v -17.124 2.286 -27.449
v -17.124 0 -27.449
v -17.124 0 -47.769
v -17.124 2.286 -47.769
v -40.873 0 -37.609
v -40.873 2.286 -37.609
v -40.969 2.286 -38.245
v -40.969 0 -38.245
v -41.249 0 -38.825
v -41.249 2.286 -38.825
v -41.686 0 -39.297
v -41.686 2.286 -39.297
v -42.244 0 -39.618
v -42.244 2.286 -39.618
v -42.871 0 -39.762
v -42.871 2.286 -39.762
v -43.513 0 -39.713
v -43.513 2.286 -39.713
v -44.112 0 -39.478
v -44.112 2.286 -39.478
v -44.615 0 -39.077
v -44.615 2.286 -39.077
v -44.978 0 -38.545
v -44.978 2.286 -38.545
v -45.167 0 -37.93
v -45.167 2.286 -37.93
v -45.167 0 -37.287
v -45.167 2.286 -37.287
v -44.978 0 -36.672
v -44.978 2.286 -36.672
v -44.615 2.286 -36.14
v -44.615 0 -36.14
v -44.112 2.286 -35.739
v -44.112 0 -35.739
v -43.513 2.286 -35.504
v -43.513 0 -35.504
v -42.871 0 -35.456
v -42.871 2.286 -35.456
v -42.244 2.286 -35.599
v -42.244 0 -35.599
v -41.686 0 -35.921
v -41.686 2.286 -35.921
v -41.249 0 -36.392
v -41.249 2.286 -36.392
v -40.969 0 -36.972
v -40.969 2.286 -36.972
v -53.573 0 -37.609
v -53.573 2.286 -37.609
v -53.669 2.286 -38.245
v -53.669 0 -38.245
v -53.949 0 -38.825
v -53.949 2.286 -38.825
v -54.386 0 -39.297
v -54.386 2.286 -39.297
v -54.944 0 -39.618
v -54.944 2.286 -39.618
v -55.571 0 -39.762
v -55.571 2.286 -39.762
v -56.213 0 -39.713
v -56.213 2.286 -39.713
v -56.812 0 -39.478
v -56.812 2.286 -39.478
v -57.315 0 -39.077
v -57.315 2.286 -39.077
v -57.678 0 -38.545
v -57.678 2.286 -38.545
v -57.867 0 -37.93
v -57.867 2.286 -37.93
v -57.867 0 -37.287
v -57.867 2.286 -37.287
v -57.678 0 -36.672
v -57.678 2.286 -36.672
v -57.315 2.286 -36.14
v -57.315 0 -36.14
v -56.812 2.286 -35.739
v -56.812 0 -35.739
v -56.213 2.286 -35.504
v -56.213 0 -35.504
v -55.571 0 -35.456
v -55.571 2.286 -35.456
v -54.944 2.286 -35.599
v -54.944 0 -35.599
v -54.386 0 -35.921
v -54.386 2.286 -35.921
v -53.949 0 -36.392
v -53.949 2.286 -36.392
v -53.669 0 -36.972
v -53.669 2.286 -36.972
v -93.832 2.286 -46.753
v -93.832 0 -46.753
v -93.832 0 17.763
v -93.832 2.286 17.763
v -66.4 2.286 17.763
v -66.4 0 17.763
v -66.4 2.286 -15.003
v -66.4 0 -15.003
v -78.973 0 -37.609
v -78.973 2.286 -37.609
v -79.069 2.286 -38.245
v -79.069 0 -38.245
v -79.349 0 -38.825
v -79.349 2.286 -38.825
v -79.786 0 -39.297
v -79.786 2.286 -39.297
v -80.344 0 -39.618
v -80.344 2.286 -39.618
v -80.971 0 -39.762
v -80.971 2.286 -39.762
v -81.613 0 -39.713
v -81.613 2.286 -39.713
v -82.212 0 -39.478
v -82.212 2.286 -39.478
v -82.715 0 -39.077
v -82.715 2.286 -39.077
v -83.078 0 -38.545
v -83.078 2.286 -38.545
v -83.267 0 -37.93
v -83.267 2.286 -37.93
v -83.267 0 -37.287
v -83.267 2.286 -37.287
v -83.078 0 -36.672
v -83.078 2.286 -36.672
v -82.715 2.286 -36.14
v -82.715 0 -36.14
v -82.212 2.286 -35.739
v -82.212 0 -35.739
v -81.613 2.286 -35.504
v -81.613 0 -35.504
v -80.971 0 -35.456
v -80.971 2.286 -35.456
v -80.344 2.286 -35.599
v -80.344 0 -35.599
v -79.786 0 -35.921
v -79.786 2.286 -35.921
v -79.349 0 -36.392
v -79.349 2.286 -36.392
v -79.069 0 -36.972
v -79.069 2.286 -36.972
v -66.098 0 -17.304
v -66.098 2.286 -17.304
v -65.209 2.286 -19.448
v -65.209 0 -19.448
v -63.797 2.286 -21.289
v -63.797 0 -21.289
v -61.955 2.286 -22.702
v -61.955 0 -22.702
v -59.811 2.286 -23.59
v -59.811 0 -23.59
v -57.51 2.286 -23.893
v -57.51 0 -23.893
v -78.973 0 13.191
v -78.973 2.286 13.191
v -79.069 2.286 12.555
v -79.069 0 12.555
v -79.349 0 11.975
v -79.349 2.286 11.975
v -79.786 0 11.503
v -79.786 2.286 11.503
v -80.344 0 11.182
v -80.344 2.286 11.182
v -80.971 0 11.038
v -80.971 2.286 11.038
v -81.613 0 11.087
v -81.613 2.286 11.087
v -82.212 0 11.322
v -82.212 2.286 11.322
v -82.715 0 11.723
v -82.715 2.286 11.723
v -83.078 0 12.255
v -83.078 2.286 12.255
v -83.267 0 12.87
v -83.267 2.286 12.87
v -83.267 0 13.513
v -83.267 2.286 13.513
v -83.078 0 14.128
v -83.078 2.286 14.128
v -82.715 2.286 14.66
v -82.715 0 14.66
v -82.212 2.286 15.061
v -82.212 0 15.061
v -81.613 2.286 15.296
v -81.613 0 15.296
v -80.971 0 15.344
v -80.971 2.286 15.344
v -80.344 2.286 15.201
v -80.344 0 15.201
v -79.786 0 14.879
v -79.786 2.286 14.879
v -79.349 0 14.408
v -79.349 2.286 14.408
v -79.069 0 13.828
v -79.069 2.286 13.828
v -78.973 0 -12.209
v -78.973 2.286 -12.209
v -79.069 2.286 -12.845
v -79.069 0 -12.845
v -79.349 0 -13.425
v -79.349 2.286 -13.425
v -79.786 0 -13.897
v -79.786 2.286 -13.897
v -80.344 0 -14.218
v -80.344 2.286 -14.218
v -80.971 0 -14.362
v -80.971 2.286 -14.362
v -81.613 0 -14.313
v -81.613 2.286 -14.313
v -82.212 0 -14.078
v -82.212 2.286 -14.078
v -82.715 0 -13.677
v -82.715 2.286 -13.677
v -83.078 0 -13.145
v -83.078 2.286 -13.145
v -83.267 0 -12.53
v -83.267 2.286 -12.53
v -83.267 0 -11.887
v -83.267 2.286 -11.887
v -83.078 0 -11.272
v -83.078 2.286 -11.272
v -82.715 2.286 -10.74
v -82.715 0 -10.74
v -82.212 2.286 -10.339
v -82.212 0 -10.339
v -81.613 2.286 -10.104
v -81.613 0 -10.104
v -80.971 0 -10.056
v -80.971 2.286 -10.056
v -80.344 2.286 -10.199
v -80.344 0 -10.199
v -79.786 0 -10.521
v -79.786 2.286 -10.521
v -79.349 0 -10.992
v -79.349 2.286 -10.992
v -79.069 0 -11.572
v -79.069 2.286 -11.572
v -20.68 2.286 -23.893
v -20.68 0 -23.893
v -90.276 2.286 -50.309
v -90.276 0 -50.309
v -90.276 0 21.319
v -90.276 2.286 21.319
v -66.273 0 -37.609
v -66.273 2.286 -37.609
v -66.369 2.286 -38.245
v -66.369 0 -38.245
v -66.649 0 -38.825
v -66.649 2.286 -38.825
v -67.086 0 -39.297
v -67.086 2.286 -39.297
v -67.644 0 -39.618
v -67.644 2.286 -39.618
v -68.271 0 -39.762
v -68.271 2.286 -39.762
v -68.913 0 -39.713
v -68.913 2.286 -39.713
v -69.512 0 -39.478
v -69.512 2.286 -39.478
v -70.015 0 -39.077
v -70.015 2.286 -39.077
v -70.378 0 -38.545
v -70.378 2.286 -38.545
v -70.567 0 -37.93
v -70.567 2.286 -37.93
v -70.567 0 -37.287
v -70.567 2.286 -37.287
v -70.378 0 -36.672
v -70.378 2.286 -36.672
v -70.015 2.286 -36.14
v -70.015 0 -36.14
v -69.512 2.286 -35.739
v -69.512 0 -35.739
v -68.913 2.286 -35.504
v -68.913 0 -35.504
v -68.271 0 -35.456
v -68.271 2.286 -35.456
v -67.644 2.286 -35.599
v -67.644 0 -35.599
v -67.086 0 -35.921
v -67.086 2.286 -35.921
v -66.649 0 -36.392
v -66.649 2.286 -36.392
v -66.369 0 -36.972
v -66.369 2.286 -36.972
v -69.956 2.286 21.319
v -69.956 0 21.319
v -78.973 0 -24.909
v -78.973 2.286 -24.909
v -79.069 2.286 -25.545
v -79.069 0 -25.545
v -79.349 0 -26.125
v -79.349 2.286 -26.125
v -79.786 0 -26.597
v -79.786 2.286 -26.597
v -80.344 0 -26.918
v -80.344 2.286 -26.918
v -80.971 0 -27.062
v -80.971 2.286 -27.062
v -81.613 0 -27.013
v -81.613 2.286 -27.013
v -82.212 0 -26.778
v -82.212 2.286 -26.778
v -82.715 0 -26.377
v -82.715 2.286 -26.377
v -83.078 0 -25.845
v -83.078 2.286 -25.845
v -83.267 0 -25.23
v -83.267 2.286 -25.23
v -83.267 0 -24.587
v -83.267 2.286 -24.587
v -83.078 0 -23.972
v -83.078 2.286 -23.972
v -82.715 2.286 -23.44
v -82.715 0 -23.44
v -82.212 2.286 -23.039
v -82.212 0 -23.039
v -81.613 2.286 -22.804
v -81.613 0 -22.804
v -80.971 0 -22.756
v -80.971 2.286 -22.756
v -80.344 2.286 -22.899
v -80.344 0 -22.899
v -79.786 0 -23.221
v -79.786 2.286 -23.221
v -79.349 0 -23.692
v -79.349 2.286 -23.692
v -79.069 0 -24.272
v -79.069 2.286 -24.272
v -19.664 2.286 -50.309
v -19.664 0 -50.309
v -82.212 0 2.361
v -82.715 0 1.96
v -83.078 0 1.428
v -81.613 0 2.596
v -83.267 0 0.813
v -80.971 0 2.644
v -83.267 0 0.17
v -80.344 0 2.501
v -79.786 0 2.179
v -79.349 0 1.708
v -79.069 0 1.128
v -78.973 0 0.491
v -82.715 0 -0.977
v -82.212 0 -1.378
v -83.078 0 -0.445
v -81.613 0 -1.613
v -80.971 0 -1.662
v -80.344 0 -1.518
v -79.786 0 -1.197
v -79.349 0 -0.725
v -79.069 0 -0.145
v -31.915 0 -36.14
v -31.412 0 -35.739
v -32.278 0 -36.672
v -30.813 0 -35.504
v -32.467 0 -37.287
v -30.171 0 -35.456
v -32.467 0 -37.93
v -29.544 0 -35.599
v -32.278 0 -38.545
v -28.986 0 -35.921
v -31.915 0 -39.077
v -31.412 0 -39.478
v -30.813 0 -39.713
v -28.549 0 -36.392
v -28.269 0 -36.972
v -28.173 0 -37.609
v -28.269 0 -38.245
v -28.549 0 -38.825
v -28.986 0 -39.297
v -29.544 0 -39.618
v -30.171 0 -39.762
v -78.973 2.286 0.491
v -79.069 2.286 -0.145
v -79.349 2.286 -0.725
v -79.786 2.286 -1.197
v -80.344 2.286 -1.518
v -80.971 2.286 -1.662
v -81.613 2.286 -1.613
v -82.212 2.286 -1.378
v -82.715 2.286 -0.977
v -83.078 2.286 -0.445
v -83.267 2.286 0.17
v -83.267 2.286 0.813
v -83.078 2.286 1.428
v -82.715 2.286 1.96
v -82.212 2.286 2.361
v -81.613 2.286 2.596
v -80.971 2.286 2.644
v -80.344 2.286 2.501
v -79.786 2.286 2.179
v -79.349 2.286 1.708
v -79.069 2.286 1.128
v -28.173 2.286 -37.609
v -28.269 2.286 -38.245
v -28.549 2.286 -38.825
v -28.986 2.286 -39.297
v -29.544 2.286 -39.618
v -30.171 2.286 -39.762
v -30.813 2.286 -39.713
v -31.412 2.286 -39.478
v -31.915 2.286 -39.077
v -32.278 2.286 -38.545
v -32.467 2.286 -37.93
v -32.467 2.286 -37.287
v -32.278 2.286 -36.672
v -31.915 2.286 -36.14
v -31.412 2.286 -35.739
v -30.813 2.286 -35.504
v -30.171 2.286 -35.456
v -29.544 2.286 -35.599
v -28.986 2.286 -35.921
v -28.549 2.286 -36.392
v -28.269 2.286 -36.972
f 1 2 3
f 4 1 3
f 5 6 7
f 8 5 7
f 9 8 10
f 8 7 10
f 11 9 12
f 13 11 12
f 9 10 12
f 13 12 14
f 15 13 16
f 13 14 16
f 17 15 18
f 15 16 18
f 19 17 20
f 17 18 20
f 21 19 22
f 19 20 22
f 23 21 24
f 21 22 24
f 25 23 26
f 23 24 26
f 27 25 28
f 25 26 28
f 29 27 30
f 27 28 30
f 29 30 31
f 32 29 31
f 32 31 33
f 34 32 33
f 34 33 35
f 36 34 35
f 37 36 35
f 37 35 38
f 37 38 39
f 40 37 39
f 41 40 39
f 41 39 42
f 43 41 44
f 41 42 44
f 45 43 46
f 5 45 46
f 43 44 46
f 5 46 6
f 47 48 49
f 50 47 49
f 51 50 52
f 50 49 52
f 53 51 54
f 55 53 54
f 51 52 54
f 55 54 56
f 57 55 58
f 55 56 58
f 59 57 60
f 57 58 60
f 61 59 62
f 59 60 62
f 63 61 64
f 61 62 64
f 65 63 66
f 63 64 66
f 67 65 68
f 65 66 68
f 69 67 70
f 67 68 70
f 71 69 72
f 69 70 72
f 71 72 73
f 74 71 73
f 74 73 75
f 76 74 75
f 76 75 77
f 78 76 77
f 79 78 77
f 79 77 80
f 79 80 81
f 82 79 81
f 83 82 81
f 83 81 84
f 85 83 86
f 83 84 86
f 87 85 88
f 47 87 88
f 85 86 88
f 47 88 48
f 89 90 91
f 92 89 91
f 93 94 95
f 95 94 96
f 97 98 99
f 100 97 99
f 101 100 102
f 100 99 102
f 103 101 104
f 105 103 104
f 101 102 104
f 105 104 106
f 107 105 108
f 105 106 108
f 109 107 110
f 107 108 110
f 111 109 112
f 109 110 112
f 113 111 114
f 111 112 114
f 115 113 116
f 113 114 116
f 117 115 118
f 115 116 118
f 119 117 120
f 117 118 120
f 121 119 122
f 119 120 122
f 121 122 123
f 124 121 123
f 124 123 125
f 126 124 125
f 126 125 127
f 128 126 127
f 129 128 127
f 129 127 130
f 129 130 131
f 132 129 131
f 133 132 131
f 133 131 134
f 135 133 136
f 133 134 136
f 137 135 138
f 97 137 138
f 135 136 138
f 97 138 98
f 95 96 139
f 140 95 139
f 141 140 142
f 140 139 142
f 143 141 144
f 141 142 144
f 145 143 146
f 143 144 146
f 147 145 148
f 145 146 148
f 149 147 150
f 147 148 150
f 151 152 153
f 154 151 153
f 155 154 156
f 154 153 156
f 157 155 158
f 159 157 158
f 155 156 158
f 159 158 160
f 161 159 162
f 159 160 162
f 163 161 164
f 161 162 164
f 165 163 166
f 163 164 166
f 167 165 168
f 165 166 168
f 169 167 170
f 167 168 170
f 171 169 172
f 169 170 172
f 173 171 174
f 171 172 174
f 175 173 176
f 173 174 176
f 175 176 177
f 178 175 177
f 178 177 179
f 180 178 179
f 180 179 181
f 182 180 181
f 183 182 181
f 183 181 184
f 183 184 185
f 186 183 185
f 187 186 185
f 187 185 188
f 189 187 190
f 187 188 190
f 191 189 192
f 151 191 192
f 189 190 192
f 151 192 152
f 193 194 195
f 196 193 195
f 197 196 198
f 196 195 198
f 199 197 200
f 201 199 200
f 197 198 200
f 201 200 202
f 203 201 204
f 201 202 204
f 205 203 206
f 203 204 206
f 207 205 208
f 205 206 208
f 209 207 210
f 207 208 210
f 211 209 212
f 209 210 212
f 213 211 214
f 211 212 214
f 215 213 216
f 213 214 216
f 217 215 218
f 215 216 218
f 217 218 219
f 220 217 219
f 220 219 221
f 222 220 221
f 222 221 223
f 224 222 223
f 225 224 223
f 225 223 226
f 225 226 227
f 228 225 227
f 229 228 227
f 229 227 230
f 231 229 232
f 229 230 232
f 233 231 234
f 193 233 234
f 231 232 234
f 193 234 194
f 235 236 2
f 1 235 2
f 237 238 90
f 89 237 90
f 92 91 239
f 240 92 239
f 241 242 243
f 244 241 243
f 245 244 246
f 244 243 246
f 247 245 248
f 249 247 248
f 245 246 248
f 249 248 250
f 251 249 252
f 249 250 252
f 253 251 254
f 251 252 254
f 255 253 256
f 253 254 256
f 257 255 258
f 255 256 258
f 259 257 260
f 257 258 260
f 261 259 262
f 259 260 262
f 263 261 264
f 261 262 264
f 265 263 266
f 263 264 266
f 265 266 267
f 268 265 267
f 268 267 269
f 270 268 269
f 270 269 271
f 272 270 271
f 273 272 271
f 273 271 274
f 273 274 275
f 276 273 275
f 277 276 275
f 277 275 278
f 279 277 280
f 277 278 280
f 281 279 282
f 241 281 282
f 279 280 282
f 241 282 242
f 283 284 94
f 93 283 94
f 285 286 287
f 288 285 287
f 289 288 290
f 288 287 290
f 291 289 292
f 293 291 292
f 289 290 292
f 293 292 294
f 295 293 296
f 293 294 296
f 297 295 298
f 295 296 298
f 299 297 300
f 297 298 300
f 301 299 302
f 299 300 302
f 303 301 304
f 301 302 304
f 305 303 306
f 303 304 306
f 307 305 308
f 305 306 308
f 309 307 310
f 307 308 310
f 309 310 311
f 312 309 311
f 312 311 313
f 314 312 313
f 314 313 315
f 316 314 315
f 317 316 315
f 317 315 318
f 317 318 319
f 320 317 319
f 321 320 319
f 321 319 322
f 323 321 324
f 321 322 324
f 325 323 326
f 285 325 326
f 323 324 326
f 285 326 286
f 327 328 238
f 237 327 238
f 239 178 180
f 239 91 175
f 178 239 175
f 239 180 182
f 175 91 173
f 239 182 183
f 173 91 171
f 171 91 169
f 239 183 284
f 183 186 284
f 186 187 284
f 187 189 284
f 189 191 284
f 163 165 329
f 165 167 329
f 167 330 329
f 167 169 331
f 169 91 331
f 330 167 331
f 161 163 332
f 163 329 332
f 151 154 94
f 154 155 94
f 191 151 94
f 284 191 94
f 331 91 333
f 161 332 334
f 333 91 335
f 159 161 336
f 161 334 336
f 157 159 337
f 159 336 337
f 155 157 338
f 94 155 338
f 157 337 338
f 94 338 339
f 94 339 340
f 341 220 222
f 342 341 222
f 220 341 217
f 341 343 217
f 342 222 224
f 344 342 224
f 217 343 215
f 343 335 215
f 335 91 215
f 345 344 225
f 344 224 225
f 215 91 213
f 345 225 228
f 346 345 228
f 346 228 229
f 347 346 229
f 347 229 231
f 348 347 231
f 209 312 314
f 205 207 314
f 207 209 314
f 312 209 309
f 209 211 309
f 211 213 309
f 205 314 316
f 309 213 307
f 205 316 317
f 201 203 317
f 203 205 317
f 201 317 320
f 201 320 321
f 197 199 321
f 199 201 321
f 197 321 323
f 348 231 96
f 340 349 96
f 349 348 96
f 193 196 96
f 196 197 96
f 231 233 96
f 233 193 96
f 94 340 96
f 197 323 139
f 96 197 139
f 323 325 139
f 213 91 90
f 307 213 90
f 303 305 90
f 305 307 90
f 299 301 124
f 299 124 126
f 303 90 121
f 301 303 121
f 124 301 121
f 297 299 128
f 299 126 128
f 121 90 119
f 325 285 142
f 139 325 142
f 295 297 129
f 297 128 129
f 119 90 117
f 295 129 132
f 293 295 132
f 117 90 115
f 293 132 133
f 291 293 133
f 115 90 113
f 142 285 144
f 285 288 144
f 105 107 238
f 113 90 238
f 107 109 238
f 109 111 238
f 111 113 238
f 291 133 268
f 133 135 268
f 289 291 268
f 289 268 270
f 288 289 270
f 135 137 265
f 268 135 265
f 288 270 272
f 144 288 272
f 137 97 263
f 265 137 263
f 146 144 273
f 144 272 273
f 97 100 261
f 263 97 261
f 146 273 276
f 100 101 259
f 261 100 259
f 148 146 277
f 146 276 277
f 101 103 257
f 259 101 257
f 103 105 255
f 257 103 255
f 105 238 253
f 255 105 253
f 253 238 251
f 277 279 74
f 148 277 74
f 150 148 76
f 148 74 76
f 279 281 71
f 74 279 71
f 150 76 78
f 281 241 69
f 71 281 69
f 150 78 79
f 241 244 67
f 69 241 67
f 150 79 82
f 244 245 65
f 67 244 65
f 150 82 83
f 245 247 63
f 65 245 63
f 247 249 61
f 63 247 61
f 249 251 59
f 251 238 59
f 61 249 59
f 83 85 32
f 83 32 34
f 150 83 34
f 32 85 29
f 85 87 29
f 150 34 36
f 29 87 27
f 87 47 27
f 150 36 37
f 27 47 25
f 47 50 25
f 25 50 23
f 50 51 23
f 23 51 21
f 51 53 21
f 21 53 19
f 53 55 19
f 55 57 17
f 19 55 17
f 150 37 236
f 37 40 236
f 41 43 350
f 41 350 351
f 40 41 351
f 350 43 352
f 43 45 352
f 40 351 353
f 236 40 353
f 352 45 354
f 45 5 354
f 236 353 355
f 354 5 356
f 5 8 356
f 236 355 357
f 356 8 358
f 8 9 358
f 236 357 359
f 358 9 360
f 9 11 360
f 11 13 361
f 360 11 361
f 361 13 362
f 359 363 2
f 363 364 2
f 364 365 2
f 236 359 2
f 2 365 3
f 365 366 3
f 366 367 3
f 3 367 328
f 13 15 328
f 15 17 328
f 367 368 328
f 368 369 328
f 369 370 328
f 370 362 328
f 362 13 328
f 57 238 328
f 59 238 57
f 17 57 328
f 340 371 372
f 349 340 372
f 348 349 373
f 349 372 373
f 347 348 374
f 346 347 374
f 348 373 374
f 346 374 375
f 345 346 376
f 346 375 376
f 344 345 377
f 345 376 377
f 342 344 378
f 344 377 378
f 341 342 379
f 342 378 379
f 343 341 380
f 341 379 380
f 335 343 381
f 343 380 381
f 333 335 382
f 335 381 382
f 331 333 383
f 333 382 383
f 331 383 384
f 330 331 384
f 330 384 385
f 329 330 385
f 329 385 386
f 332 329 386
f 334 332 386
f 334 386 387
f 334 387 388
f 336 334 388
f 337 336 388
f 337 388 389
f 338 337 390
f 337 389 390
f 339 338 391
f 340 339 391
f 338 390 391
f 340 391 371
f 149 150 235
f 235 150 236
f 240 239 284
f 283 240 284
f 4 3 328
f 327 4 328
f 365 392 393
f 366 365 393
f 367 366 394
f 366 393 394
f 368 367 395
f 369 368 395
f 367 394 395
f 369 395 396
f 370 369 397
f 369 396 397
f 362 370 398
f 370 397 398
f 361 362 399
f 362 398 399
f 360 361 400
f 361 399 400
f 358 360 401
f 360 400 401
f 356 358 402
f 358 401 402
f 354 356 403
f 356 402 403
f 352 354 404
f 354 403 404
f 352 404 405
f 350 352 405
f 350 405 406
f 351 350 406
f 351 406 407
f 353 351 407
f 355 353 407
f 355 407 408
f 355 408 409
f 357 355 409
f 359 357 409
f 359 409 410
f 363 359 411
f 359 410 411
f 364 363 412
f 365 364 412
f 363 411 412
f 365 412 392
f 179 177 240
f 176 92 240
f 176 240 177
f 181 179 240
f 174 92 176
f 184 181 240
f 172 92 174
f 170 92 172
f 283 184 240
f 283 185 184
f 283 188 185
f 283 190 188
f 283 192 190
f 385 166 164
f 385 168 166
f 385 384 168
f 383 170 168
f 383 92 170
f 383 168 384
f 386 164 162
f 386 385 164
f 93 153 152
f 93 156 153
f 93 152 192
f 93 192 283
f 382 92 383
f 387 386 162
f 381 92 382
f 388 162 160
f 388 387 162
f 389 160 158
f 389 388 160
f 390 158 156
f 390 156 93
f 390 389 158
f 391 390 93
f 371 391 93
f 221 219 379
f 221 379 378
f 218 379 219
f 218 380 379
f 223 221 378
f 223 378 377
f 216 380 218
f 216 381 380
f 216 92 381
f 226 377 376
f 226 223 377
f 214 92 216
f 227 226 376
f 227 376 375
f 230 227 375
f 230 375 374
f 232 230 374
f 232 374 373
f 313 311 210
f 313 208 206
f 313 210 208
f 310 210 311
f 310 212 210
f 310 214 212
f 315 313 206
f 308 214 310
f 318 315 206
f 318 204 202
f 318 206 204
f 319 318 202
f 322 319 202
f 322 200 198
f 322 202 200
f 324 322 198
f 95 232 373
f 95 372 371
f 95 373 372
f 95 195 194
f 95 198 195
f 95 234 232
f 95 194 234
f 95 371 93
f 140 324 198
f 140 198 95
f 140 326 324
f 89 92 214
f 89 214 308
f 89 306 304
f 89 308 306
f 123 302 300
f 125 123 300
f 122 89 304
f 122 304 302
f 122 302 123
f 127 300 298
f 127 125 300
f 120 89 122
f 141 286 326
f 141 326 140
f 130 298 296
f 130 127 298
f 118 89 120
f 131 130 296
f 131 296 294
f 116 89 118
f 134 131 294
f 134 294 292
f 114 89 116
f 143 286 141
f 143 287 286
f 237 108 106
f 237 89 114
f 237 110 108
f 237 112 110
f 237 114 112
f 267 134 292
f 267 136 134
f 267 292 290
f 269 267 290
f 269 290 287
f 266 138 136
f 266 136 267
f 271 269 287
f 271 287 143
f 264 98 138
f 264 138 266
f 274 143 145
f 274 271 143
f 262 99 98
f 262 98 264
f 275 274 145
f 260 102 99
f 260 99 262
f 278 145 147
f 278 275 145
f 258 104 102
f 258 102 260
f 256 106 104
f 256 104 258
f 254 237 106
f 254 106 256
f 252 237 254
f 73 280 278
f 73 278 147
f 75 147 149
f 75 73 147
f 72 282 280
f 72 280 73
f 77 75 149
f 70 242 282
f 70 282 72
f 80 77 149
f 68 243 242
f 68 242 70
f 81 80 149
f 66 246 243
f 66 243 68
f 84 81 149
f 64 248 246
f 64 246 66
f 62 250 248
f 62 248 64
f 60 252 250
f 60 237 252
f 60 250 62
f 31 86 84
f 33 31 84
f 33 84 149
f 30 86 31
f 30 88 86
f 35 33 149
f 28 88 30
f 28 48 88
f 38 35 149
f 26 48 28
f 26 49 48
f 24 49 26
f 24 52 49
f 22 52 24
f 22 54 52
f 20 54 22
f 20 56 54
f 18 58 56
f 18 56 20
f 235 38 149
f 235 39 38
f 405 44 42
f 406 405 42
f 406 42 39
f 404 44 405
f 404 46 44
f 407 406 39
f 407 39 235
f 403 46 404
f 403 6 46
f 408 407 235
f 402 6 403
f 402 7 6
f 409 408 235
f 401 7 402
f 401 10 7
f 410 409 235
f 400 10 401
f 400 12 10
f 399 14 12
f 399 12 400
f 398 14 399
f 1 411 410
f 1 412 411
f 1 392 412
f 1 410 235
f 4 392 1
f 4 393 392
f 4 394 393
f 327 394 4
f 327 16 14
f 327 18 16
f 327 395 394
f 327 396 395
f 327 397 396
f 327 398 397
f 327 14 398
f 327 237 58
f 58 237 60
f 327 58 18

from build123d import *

# Parameters (mm, degrees)
BOSS_EXTRUDE1_DEPTH = 2.286
SKETCH2_R           = 2.159
CUT_EXTRUDE1_DEPTH  = 2.286


with BuildPart() as part:
    # Sketch1 → Boss-Extrude1 (new body)
    with BuildSketch(Plane(origin=(0, 0, 0), x_dir=(1, 0, 0), z_dir=(0, 1, 0))):
        with BuildLine():
            Line((-93.832484615, 46.752607692), (-93.832484615, -17.763392308))
            Line((-93.832484615, -17.763392308), (-90.276484615, -21.319392308))
            Line((-90.276484615, -21.319392308), (-69.956484615, -21.319392308))
            Line((-69.956484615, -21.319392308), (-66.400484615, -17.763392308))
            Line((-66.400484615, -17.763392308), (-66.400484615, 15.002607692))
            ThreePointArc((-66.400484615, 15.002607692), (-63.7966639, 21.288786977), (-57.510484615, 23.892607692))
            Line((-57.510484615, 23.892607692), (-20.680484615, 23.892607692))
            Line((-20.680484615, 23.892607692), (-17.124484615, 27.448607692))
            Line((-17.124484615, 27.448607692), (-17.124484615, 47.768607692))
            Line((-17.124484615, 47.768607692), (-19.664484615, 50.308607692))
            Line((-19.664484615, 50.308607692), (-90.276484615, 50.308607692))
            Line((-90.276484615, 50.308607692), (-93.832484615, 46.752607692))
        make_face()
    extrude(amount=BOSS_EXTRUDE1_DEPTH)

    # Sketch2 → Cut-Extrude1 (cut)
    with BuildSketch(Plane(origin=(0, 2.286, 0), x_dir=(1, 0, 0), z_dir=(0, 1, 0))):
        with Locations((-81.132484615, 37.608607692)):
            Circle(SKETCH2_R)
        with Locations((-81.132484615, 24.908607692)):
            Circle(SKETCH2_R)
        with Locations((-81.132484615, 12.208607692)):
            Circle(SKETCH2_R)
        with Locations((-81.132484615, -0.491392308)):
            Circle(SKETCH2_R)
        with Locations((-81.132484615, -13.191392308)):
            Circle(SKETCH2_R)
        with Locations((-68.432484615, 37.608607692)):
            Circle(SKETCH2_R)
        with Locations((-55.732484615, 37.608607692)):
            Circle(SKETCH2_R)
        with Locations((-43.032484615, 37.608607692)):
            Circle(SKETCH2_R)
        with Locations((-30.332484615, 37.608607692)):
            Circle(SKETCH2_R)
    extrude(amount=-CUT_EXTRUDE1_DEPTH, mode=Mode.SUBTRACT)


solid = part.part
